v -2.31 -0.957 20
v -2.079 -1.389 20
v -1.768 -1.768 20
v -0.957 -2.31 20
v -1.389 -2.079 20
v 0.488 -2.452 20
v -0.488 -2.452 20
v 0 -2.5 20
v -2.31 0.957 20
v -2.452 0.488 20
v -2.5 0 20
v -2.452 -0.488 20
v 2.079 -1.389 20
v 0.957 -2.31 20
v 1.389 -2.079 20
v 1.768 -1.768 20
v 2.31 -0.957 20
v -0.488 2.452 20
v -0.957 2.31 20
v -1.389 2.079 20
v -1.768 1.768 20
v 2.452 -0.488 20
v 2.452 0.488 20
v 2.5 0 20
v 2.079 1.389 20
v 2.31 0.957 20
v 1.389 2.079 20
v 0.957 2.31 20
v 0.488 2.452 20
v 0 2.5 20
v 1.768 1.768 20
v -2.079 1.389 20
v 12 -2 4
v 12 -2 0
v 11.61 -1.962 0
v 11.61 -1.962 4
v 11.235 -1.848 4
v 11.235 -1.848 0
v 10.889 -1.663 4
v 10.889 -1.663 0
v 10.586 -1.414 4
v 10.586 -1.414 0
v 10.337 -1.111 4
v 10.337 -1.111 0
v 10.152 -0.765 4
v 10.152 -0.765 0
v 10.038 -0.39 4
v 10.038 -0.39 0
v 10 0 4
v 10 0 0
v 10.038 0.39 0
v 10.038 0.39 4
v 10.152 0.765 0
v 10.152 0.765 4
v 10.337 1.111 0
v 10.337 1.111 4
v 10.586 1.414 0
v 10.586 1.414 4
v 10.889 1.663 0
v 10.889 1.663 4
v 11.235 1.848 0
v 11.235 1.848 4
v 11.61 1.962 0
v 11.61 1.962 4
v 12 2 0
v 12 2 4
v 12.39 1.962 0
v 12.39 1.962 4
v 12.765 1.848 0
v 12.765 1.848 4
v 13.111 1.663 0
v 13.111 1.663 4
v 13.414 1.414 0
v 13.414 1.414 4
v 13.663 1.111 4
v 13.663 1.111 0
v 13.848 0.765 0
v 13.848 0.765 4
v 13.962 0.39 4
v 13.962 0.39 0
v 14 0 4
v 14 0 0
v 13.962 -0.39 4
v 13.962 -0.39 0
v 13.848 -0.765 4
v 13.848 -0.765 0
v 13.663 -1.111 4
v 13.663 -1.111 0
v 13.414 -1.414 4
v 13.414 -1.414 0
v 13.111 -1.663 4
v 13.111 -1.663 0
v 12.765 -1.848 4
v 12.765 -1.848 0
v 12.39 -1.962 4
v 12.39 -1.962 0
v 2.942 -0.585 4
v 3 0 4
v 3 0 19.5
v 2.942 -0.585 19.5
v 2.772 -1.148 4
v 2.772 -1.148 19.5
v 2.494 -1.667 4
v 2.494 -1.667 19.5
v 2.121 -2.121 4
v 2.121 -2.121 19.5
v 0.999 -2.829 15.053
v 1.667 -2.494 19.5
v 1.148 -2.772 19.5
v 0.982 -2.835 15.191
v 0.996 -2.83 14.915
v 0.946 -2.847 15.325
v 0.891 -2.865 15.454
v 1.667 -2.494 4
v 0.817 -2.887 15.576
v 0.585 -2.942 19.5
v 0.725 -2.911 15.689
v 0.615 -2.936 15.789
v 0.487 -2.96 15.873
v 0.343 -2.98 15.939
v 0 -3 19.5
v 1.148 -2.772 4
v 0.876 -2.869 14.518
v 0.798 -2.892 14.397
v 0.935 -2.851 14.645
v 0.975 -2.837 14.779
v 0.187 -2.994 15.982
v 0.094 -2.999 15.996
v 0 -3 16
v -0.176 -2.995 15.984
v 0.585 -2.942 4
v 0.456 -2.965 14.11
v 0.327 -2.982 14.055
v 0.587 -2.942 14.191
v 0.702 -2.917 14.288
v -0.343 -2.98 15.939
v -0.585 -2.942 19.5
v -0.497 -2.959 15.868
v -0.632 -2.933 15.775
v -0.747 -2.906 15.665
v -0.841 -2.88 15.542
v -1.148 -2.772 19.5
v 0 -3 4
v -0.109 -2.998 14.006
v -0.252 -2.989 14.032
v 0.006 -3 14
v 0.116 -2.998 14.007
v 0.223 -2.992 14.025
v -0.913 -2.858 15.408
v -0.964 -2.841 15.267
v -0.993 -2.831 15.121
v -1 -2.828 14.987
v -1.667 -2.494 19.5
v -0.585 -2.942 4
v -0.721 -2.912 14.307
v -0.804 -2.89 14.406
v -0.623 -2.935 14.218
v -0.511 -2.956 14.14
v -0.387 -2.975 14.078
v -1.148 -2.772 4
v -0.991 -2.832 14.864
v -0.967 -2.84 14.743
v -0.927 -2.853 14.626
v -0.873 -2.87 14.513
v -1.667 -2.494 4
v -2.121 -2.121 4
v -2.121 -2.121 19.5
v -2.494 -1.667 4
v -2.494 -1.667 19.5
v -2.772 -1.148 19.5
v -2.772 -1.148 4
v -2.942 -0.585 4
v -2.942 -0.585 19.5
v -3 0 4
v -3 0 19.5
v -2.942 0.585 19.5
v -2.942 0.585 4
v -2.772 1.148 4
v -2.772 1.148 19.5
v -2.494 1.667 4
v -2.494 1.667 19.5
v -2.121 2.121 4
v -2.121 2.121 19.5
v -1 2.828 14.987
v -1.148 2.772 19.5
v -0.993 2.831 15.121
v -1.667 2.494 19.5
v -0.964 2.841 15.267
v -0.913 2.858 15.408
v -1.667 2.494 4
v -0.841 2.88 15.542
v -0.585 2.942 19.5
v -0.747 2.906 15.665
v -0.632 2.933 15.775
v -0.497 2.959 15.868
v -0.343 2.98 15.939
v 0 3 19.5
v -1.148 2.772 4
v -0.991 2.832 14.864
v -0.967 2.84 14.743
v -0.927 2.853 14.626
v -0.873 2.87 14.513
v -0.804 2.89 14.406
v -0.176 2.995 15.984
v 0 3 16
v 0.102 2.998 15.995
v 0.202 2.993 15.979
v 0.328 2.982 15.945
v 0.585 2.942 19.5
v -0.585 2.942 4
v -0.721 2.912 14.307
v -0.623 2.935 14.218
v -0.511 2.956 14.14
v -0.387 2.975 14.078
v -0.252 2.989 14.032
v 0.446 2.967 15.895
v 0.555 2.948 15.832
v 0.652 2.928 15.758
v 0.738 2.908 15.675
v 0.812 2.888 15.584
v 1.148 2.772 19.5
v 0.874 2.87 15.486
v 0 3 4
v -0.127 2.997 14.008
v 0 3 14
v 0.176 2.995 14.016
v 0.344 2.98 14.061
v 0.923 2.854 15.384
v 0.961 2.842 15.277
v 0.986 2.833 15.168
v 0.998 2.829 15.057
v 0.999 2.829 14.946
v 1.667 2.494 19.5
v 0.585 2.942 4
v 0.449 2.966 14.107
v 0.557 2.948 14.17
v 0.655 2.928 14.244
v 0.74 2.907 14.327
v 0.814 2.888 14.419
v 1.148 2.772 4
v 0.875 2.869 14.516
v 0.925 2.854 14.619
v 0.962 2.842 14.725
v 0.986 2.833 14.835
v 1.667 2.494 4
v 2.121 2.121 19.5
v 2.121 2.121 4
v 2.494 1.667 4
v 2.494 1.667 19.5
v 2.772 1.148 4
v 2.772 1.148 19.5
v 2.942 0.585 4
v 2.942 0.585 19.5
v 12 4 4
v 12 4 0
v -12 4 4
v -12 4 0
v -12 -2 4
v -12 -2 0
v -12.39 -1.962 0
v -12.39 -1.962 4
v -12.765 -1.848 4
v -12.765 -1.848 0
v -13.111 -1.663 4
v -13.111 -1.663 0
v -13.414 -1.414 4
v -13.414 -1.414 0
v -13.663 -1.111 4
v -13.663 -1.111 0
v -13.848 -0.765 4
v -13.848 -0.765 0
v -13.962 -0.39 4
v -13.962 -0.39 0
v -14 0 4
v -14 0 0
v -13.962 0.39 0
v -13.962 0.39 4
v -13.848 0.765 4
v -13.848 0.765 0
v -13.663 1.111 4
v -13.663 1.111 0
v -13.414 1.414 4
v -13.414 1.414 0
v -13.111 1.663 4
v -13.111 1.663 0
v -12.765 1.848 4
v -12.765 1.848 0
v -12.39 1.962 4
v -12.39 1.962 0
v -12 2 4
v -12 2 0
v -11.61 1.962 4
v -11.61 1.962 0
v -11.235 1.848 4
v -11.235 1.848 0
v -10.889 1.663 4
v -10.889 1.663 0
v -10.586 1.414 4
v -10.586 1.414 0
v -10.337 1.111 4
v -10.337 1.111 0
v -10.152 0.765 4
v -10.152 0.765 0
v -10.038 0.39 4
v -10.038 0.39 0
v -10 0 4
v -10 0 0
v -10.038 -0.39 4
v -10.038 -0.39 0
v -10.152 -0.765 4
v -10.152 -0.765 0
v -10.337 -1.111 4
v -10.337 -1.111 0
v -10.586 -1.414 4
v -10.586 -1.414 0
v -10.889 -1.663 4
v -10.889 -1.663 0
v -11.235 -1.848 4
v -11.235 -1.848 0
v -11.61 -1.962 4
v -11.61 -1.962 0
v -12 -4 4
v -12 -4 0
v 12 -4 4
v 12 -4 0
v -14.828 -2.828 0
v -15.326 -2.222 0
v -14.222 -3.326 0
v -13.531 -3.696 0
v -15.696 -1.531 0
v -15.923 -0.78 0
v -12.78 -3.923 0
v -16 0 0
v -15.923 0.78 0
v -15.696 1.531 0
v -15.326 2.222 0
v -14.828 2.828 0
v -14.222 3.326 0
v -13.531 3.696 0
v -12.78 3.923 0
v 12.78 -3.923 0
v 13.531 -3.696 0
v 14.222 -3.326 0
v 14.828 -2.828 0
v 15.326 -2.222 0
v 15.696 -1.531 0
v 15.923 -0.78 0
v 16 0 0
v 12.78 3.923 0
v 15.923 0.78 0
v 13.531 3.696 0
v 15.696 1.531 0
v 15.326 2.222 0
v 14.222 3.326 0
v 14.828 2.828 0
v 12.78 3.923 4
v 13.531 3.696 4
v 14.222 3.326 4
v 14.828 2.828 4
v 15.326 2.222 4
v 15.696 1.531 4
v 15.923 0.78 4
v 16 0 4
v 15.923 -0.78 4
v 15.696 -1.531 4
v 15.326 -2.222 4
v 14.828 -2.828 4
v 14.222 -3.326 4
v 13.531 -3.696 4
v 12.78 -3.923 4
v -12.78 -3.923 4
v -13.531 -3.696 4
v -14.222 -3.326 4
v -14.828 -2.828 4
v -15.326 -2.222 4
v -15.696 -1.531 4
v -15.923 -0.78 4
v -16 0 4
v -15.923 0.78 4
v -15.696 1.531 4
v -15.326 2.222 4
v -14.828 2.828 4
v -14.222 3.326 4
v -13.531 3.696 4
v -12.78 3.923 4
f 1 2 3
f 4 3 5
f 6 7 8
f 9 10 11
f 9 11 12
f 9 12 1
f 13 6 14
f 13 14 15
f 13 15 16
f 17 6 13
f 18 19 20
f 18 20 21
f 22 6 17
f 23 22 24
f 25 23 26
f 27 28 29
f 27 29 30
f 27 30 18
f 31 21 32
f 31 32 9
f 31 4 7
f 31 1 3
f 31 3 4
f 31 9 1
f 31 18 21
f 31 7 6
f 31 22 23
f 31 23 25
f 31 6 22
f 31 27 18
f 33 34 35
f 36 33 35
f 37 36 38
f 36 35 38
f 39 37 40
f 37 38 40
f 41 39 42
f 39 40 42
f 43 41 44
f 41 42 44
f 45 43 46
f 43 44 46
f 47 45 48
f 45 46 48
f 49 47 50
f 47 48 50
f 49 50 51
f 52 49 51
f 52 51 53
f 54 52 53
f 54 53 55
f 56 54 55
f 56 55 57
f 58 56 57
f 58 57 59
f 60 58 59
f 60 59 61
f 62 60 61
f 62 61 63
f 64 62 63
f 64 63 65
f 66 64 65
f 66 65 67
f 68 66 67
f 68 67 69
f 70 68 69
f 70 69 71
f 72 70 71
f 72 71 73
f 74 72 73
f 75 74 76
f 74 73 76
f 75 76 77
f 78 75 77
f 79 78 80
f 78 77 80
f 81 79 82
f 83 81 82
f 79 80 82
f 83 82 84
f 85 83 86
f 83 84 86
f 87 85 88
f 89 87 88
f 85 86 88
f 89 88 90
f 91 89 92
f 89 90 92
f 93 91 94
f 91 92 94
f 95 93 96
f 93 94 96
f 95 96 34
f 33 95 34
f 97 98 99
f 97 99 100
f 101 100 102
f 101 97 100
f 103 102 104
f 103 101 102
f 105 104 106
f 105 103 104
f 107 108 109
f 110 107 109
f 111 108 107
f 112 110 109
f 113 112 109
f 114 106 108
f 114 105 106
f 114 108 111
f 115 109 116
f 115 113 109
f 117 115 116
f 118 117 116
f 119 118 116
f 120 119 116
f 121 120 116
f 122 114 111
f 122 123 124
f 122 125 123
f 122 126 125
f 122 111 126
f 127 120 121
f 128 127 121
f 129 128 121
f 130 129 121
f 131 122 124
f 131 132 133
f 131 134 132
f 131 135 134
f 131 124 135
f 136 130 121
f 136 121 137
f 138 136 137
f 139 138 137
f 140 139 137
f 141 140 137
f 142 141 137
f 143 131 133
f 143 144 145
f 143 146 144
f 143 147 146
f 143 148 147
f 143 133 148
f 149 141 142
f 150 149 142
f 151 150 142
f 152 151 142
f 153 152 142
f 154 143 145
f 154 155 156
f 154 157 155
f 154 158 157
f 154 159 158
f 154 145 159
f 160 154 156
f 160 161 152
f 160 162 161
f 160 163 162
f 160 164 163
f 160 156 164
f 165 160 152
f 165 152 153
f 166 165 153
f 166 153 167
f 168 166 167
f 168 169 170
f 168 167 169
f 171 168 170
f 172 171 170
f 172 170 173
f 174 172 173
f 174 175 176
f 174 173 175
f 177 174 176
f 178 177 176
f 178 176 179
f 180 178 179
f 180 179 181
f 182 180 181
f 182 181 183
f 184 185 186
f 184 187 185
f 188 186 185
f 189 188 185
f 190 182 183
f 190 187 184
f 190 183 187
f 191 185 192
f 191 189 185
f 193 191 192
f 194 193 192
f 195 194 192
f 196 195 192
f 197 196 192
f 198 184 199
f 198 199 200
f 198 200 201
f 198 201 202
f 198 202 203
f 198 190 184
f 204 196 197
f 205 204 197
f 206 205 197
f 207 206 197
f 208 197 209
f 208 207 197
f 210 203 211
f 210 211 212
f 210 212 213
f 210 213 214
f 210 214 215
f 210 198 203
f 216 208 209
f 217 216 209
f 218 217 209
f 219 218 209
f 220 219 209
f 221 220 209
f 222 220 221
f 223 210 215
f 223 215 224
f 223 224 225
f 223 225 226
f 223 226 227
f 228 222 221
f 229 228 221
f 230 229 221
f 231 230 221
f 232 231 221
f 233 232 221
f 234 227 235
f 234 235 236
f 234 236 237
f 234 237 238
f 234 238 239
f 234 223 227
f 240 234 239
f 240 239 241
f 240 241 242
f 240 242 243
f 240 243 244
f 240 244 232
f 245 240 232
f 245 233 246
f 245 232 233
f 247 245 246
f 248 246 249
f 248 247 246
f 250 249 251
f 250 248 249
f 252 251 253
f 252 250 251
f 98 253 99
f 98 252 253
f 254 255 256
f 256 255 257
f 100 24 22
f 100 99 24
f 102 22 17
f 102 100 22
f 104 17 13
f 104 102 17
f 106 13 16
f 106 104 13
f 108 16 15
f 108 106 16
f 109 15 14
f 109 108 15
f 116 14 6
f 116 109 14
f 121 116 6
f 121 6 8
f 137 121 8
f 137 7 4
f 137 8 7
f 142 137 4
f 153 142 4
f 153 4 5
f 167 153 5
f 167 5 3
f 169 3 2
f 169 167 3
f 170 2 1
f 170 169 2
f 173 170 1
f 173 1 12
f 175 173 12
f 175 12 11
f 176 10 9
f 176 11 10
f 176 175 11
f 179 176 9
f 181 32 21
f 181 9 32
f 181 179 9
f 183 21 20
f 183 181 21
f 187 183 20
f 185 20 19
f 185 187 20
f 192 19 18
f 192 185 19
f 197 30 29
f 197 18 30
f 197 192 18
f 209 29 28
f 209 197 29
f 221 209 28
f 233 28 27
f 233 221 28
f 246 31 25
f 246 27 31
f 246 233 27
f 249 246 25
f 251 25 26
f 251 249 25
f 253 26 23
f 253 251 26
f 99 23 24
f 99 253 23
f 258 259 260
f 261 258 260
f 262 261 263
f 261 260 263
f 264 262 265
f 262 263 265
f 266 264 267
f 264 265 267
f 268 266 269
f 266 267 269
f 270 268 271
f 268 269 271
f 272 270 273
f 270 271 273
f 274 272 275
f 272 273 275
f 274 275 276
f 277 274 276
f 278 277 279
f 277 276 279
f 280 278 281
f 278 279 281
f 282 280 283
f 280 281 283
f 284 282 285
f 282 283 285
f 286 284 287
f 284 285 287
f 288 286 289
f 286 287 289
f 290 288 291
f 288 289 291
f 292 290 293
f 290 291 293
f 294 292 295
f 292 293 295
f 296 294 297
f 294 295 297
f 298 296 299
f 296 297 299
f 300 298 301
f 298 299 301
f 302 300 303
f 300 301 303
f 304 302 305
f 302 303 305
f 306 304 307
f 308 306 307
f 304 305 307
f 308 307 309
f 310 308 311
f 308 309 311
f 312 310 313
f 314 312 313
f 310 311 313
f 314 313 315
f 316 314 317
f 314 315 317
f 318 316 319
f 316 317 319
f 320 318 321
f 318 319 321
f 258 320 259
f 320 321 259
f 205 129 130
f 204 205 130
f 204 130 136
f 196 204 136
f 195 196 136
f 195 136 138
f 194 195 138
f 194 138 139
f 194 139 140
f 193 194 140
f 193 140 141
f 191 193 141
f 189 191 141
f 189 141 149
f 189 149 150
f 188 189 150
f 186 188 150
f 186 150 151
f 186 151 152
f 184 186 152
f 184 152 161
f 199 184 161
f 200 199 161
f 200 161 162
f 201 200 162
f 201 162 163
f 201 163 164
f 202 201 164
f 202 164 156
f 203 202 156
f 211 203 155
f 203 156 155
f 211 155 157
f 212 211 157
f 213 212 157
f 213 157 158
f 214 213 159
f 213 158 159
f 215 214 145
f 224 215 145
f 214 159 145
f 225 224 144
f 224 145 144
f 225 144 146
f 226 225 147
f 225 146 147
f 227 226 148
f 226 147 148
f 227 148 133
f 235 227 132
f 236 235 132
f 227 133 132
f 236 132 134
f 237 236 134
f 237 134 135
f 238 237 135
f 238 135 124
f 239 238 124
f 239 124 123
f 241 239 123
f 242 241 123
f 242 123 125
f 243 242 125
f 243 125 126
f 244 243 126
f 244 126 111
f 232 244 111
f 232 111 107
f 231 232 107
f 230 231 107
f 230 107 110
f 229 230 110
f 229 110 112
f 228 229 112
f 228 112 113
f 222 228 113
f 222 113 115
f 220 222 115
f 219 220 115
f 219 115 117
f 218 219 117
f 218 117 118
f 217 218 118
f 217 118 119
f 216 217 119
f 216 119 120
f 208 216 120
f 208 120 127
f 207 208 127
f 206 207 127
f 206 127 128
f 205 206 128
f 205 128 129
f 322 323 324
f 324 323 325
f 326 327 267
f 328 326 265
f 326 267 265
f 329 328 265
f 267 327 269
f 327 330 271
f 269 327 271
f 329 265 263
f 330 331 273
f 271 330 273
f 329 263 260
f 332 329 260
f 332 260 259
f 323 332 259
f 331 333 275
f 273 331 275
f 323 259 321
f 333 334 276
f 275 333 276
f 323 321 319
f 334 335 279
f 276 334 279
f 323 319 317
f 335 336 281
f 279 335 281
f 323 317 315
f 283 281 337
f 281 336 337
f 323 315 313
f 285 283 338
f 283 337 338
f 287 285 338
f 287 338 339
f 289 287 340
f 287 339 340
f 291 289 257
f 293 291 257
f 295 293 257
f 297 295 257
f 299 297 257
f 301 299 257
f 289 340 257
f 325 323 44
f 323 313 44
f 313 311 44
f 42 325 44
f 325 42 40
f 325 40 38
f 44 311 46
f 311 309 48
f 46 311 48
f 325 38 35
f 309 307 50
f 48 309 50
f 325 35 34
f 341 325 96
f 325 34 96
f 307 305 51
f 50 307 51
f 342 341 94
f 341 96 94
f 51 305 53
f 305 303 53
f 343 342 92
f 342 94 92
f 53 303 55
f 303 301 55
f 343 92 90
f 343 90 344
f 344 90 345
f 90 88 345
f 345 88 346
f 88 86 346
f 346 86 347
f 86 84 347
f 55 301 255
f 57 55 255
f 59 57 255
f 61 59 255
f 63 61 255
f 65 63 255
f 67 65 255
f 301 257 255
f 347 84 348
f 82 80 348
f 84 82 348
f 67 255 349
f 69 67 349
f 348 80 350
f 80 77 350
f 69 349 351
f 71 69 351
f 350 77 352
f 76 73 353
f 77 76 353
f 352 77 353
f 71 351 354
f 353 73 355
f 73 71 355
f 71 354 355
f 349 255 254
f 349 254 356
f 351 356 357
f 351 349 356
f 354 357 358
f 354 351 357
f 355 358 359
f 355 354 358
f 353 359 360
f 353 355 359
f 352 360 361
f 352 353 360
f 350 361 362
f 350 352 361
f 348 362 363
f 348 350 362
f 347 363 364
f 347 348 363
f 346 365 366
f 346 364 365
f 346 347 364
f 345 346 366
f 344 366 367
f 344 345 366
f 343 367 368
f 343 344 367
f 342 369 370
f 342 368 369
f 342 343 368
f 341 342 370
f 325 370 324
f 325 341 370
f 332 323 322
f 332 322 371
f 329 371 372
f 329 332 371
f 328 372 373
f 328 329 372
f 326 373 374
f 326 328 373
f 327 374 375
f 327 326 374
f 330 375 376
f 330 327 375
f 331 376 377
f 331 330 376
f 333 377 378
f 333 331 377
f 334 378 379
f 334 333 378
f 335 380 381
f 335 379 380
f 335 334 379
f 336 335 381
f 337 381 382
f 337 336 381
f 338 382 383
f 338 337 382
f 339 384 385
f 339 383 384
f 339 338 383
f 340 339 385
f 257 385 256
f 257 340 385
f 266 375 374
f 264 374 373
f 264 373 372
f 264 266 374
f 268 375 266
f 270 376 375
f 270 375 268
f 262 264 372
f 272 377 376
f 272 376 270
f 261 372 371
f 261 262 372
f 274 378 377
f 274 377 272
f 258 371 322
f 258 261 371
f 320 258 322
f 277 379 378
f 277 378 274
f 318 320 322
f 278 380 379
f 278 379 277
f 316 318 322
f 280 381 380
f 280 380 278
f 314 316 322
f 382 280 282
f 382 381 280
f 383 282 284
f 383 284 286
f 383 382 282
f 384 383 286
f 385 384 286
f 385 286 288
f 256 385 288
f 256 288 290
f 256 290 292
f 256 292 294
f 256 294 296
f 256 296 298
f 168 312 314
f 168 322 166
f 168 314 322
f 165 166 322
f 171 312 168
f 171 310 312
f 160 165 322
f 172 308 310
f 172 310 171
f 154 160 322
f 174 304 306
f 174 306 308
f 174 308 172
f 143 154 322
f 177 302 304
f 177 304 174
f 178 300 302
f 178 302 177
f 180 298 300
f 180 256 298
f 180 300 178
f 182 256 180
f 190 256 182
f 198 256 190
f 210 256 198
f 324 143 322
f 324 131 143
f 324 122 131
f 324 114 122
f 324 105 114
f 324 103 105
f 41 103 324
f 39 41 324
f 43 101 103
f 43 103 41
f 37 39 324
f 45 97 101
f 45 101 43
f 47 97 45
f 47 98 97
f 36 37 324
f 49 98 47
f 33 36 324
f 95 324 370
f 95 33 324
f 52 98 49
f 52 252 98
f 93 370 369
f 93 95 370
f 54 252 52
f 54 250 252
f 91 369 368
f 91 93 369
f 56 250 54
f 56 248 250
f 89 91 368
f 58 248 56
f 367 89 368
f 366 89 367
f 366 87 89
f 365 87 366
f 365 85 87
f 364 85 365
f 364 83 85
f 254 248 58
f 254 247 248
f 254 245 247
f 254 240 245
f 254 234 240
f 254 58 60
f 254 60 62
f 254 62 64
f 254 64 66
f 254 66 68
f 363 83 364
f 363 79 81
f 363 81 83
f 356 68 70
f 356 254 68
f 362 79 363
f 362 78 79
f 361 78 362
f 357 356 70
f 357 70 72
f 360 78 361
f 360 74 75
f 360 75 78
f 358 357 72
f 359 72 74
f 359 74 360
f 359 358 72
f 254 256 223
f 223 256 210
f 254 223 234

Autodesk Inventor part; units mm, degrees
ref_plane "XZ Plane" through (0, 0, 0) normal (0, 1, 0) x (-1, 0, 0)
ref_plane "XY Plane" through (0, 0, 0) normal (0, 0, 1) x (1, 0, 0)
sketch "Sketch1" plane through (0, 0, 0) normal (0, 0, 1) x (1, 0, 0)
  line L0 (-12, 0) -> (12, 0) construction
  line L1 (-12, -4) -> (12, -4)
  line L2 (12, 4) -> (-12, 4)
  arc A0 (-12, 4) -> (-12, -4) centre (-12, 0) ccw
  arc A1 (12, -4) -> (12, 4) centre (12, 0) ccw
  point P0 (0, 0)
  dimension "d0" = 24
  dimension "d1" = 4
extrude "Extrusion1" add sketch "Sketch1" along normal blind 4
sketch "Sketch2" plane through (0, 0, 4) normal (0, 0, 1) x (1, 0, 0)
  circle A0 centre (0, 0) radius 3
  dimension "d4" = 6
extrude "Extrusion2" add sketch "Sketch2" along normal blind 16
chamfer "Chamfer1" distance 0.5 angle 45 1 edges at (-3, 0, 20)
sketch "Sketch3" plane through (0, 0, 4) normal (0, 0, 1) x (1, 0, 0)
  arc A0 (12, -4) -> (12, 4) centre (12, 0) ccw projected
  arc A1 (-12, 4) -> (-12, -4) centre (-12, 0) ccw projected
hole "Hole1" at (-12, 0, 4) at (12, 0, 4) direction (0, 0, -1) diameter 4 end through all
ref_plane "Work Plane1" through (0, 0, 15) normal (0, 0, 1) x (1, 0, 0)
hole "Hole2" at (0, 3, 15) direction (0, -1, 0) diameter 2 end through all
properties part number "Crank" material "Steel"
